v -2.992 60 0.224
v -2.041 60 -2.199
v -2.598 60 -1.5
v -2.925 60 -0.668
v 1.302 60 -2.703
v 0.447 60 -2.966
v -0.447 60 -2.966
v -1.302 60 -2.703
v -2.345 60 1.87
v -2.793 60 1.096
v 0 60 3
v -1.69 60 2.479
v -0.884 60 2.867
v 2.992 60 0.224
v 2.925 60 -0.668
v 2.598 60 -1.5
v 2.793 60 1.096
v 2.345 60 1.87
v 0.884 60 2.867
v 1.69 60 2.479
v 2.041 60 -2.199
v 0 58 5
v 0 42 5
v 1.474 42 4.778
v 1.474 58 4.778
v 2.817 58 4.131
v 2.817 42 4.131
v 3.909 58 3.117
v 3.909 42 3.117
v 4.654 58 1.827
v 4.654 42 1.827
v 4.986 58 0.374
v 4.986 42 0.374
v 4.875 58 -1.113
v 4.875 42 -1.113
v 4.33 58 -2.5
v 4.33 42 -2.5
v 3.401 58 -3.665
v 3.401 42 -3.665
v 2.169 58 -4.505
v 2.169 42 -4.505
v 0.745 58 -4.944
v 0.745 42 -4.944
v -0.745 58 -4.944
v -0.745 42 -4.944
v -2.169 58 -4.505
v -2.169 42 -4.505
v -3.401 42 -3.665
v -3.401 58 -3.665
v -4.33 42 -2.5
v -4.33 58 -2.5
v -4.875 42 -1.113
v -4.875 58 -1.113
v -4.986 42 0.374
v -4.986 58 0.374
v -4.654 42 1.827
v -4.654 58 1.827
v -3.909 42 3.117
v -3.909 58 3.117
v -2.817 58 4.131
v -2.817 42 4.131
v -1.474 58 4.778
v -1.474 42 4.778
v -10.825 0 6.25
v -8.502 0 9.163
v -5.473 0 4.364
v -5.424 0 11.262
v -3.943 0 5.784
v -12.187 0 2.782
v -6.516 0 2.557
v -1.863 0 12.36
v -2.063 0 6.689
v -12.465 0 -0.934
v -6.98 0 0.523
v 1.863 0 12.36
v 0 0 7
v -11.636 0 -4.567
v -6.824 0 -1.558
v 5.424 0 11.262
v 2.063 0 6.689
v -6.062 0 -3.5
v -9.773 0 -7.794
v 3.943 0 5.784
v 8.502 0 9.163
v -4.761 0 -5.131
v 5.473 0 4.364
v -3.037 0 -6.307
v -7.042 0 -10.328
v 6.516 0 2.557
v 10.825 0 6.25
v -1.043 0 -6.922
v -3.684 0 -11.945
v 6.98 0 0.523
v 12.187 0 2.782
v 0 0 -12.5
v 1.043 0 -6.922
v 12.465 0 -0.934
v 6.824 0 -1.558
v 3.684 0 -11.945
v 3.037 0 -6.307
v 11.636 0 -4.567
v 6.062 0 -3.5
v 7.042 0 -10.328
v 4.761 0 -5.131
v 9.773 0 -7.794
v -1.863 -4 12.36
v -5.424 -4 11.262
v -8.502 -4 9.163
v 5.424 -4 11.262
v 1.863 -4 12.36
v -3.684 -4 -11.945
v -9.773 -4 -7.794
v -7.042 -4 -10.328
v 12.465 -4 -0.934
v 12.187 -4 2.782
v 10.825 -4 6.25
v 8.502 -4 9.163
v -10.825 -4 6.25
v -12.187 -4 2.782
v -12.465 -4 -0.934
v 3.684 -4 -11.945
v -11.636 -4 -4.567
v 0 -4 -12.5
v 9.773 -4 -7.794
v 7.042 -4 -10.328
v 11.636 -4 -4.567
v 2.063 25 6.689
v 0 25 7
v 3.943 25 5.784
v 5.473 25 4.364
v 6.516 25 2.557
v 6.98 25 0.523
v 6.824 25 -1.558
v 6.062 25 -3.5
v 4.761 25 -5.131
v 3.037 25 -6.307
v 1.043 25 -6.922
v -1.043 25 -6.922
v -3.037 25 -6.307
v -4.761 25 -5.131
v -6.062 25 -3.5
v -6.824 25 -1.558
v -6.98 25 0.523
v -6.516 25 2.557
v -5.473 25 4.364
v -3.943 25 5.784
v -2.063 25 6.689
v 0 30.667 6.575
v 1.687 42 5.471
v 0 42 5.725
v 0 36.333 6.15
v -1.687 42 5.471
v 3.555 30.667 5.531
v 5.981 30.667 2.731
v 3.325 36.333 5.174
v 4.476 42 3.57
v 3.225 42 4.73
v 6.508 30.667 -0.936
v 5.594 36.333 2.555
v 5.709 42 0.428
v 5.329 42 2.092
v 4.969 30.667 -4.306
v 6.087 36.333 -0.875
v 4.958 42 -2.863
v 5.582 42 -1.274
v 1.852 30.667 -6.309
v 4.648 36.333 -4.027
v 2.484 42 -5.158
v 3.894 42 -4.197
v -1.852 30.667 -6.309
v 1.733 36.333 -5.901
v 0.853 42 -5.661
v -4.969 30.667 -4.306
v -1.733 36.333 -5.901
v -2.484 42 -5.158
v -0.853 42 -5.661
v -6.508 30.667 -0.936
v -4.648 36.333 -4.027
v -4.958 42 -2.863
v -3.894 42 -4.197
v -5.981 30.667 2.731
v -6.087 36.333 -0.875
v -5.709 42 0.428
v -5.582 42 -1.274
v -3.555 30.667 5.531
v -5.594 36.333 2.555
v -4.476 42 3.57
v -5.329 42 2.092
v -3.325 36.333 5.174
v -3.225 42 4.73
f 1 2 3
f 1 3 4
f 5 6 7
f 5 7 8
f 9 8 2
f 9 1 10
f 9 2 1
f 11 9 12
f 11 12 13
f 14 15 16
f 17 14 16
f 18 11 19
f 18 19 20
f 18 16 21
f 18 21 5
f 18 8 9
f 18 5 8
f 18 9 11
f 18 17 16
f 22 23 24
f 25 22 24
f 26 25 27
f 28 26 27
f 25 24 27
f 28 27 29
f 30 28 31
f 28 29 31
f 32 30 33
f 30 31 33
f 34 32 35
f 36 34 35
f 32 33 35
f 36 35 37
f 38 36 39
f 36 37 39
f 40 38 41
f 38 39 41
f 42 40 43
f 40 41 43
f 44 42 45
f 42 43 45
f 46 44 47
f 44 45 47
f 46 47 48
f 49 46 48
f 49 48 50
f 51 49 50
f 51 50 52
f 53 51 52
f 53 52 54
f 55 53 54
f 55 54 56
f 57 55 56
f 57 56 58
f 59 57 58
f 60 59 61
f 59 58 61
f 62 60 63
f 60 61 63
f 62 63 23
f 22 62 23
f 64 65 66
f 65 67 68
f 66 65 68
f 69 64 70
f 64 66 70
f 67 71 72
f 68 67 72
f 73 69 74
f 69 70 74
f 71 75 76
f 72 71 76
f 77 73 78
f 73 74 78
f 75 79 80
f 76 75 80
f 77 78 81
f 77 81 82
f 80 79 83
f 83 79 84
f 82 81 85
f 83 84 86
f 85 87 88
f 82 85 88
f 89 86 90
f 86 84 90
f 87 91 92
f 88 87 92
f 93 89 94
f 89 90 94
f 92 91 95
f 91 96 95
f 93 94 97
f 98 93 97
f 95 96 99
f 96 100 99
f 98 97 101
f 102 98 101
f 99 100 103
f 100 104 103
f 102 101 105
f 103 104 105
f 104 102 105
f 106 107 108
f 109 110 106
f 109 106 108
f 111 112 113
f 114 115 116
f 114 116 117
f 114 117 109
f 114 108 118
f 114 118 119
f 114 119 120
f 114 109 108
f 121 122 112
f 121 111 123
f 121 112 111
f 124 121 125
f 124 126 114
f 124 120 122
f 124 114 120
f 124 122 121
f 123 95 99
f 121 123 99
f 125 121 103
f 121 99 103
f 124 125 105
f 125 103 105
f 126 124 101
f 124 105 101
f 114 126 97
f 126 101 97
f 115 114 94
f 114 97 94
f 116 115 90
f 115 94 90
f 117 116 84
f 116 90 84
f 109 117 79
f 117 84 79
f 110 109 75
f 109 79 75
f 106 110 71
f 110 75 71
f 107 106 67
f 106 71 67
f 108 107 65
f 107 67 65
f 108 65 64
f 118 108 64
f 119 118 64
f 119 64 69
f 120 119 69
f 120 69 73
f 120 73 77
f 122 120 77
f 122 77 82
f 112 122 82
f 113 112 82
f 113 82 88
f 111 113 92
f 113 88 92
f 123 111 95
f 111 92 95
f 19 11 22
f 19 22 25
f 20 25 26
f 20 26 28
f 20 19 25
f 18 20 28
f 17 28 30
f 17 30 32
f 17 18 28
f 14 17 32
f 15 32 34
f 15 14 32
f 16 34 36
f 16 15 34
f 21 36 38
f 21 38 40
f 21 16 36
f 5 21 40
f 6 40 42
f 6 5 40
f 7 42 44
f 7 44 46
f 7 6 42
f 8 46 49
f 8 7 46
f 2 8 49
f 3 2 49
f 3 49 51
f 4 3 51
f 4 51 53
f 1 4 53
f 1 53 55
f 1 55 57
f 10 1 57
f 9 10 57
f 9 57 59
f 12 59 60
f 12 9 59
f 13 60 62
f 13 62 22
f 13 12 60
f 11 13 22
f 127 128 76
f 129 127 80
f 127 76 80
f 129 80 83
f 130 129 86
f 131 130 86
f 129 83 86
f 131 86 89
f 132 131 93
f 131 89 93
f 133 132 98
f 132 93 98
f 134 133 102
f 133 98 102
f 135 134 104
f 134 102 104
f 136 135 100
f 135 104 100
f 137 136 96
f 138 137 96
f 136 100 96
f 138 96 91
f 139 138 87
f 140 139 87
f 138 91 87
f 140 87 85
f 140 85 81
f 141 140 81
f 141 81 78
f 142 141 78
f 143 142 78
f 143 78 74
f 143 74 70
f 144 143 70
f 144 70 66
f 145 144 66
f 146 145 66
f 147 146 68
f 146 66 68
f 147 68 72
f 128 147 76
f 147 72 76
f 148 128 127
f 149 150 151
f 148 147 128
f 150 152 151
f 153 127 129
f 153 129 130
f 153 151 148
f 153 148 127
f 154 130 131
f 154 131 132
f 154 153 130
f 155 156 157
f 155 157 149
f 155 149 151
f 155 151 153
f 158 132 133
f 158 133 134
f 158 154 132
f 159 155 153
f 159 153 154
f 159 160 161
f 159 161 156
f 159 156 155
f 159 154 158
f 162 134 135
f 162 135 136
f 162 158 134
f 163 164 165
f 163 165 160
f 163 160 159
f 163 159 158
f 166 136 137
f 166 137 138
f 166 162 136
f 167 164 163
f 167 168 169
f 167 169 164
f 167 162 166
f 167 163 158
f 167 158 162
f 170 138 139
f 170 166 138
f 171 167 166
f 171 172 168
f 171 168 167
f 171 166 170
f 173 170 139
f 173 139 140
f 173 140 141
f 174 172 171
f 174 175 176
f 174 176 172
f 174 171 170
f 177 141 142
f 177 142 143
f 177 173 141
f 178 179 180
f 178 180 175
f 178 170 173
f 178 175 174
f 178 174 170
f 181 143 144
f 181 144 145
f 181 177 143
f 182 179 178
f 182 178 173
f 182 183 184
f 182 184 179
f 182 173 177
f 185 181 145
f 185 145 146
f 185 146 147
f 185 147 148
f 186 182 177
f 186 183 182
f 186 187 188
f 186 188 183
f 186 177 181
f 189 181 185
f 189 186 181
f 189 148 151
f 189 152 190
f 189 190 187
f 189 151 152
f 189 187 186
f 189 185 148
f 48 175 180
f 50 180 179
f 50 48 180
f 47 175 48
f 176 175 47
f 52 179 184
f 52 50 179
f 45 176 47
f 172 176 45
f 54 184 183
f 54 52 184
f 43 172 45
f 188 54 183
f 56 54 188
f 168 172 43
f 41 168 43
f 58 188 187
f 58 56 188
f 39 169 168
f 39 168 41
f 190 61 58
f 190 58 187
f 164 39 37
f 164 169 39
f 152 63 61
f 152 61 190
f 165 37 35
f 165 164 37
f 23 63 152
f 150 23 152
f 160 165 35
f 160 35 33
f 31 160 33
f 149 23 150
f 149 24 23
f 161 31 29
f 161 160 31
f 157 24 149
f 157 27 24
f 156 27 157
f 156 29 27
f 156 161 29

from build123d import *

# Parameters (mm, degrees)
SKETCH2_R           = 7
BOSS_EXTRUDE1_DEPTH = 25
SKETCH3_R           = 7
BOSS_EXTRUDE2_DEPTH = 17
BOSS_EXTRUDE2_TAPER = 4.289
SKETCH4_R           = 5
BOSS_EXTRUDE3_DEPTH = 18
CHAMFER1_SIZE       = 2
SKETCH5_R           = 12.5
BOSS_EXTRUDE4_DEPTH = 4


with BuildPart() as part:
    # Sketch2 → Boss-Extrude1 (new body)
    with BuildSketch(Plane(origin=(0, 0, 0), x_dir=(1, 0, 0), z_dir=(0, 1, 0))):
        with Locations(Location((0, 0, 0), (0, 0, 270))):
            Circle(SKETCH2_R)
    extrude(amount=BOSS_EXTRUDE1_DEPTH)

    # Sketch3 → Boss-Extrude2 (add)
    with BuildSketch(Plane(origin=(0, 25, 0), x_dir=(1, 0, 0), z_dir=(0, 1, 0))):
        with Locations(Location((0, 0, 0), (0, 0, 270))):
            Circle(SKETCH3_R)
    extrude(amount=BOSS_EXTRUDE2_DEPTH, taper=BOSS_EXTRUDE2_TAPER)

    # Sketch4 → Boss-Extrude3 (add)
    with BuildSketch(Plane(origin=(0, 42, 0), x_dir=(1, 0, 0), z_dir=(0, 1, 0))):
        with Locations(Location((0, 0, 0), (0, 0, 270))):
            Circle(SKETCH4_R)
    extrude(amount=BOSS_EXTRUDE3_DEPTH)

    # Chamfer1
    chamfer1_edges = [part.edges().sort_by_distance(p)[0] for p in [
        (0, 60, -5),
    ]]
    chamfer(chamfer1_edges, length=CHAMFER1_SIZE)

    # Sketch5 → Boss-Extrude4 (add)
    with BuildSketch(Plane.XZ):
        with Locations(Location((0, 0, 0), (0, 0, 270))):
            Circle(SKETCH5_R)
    extrude(amount=BOSS_EXTRUDE4_DEPTH)


solid = part.part
